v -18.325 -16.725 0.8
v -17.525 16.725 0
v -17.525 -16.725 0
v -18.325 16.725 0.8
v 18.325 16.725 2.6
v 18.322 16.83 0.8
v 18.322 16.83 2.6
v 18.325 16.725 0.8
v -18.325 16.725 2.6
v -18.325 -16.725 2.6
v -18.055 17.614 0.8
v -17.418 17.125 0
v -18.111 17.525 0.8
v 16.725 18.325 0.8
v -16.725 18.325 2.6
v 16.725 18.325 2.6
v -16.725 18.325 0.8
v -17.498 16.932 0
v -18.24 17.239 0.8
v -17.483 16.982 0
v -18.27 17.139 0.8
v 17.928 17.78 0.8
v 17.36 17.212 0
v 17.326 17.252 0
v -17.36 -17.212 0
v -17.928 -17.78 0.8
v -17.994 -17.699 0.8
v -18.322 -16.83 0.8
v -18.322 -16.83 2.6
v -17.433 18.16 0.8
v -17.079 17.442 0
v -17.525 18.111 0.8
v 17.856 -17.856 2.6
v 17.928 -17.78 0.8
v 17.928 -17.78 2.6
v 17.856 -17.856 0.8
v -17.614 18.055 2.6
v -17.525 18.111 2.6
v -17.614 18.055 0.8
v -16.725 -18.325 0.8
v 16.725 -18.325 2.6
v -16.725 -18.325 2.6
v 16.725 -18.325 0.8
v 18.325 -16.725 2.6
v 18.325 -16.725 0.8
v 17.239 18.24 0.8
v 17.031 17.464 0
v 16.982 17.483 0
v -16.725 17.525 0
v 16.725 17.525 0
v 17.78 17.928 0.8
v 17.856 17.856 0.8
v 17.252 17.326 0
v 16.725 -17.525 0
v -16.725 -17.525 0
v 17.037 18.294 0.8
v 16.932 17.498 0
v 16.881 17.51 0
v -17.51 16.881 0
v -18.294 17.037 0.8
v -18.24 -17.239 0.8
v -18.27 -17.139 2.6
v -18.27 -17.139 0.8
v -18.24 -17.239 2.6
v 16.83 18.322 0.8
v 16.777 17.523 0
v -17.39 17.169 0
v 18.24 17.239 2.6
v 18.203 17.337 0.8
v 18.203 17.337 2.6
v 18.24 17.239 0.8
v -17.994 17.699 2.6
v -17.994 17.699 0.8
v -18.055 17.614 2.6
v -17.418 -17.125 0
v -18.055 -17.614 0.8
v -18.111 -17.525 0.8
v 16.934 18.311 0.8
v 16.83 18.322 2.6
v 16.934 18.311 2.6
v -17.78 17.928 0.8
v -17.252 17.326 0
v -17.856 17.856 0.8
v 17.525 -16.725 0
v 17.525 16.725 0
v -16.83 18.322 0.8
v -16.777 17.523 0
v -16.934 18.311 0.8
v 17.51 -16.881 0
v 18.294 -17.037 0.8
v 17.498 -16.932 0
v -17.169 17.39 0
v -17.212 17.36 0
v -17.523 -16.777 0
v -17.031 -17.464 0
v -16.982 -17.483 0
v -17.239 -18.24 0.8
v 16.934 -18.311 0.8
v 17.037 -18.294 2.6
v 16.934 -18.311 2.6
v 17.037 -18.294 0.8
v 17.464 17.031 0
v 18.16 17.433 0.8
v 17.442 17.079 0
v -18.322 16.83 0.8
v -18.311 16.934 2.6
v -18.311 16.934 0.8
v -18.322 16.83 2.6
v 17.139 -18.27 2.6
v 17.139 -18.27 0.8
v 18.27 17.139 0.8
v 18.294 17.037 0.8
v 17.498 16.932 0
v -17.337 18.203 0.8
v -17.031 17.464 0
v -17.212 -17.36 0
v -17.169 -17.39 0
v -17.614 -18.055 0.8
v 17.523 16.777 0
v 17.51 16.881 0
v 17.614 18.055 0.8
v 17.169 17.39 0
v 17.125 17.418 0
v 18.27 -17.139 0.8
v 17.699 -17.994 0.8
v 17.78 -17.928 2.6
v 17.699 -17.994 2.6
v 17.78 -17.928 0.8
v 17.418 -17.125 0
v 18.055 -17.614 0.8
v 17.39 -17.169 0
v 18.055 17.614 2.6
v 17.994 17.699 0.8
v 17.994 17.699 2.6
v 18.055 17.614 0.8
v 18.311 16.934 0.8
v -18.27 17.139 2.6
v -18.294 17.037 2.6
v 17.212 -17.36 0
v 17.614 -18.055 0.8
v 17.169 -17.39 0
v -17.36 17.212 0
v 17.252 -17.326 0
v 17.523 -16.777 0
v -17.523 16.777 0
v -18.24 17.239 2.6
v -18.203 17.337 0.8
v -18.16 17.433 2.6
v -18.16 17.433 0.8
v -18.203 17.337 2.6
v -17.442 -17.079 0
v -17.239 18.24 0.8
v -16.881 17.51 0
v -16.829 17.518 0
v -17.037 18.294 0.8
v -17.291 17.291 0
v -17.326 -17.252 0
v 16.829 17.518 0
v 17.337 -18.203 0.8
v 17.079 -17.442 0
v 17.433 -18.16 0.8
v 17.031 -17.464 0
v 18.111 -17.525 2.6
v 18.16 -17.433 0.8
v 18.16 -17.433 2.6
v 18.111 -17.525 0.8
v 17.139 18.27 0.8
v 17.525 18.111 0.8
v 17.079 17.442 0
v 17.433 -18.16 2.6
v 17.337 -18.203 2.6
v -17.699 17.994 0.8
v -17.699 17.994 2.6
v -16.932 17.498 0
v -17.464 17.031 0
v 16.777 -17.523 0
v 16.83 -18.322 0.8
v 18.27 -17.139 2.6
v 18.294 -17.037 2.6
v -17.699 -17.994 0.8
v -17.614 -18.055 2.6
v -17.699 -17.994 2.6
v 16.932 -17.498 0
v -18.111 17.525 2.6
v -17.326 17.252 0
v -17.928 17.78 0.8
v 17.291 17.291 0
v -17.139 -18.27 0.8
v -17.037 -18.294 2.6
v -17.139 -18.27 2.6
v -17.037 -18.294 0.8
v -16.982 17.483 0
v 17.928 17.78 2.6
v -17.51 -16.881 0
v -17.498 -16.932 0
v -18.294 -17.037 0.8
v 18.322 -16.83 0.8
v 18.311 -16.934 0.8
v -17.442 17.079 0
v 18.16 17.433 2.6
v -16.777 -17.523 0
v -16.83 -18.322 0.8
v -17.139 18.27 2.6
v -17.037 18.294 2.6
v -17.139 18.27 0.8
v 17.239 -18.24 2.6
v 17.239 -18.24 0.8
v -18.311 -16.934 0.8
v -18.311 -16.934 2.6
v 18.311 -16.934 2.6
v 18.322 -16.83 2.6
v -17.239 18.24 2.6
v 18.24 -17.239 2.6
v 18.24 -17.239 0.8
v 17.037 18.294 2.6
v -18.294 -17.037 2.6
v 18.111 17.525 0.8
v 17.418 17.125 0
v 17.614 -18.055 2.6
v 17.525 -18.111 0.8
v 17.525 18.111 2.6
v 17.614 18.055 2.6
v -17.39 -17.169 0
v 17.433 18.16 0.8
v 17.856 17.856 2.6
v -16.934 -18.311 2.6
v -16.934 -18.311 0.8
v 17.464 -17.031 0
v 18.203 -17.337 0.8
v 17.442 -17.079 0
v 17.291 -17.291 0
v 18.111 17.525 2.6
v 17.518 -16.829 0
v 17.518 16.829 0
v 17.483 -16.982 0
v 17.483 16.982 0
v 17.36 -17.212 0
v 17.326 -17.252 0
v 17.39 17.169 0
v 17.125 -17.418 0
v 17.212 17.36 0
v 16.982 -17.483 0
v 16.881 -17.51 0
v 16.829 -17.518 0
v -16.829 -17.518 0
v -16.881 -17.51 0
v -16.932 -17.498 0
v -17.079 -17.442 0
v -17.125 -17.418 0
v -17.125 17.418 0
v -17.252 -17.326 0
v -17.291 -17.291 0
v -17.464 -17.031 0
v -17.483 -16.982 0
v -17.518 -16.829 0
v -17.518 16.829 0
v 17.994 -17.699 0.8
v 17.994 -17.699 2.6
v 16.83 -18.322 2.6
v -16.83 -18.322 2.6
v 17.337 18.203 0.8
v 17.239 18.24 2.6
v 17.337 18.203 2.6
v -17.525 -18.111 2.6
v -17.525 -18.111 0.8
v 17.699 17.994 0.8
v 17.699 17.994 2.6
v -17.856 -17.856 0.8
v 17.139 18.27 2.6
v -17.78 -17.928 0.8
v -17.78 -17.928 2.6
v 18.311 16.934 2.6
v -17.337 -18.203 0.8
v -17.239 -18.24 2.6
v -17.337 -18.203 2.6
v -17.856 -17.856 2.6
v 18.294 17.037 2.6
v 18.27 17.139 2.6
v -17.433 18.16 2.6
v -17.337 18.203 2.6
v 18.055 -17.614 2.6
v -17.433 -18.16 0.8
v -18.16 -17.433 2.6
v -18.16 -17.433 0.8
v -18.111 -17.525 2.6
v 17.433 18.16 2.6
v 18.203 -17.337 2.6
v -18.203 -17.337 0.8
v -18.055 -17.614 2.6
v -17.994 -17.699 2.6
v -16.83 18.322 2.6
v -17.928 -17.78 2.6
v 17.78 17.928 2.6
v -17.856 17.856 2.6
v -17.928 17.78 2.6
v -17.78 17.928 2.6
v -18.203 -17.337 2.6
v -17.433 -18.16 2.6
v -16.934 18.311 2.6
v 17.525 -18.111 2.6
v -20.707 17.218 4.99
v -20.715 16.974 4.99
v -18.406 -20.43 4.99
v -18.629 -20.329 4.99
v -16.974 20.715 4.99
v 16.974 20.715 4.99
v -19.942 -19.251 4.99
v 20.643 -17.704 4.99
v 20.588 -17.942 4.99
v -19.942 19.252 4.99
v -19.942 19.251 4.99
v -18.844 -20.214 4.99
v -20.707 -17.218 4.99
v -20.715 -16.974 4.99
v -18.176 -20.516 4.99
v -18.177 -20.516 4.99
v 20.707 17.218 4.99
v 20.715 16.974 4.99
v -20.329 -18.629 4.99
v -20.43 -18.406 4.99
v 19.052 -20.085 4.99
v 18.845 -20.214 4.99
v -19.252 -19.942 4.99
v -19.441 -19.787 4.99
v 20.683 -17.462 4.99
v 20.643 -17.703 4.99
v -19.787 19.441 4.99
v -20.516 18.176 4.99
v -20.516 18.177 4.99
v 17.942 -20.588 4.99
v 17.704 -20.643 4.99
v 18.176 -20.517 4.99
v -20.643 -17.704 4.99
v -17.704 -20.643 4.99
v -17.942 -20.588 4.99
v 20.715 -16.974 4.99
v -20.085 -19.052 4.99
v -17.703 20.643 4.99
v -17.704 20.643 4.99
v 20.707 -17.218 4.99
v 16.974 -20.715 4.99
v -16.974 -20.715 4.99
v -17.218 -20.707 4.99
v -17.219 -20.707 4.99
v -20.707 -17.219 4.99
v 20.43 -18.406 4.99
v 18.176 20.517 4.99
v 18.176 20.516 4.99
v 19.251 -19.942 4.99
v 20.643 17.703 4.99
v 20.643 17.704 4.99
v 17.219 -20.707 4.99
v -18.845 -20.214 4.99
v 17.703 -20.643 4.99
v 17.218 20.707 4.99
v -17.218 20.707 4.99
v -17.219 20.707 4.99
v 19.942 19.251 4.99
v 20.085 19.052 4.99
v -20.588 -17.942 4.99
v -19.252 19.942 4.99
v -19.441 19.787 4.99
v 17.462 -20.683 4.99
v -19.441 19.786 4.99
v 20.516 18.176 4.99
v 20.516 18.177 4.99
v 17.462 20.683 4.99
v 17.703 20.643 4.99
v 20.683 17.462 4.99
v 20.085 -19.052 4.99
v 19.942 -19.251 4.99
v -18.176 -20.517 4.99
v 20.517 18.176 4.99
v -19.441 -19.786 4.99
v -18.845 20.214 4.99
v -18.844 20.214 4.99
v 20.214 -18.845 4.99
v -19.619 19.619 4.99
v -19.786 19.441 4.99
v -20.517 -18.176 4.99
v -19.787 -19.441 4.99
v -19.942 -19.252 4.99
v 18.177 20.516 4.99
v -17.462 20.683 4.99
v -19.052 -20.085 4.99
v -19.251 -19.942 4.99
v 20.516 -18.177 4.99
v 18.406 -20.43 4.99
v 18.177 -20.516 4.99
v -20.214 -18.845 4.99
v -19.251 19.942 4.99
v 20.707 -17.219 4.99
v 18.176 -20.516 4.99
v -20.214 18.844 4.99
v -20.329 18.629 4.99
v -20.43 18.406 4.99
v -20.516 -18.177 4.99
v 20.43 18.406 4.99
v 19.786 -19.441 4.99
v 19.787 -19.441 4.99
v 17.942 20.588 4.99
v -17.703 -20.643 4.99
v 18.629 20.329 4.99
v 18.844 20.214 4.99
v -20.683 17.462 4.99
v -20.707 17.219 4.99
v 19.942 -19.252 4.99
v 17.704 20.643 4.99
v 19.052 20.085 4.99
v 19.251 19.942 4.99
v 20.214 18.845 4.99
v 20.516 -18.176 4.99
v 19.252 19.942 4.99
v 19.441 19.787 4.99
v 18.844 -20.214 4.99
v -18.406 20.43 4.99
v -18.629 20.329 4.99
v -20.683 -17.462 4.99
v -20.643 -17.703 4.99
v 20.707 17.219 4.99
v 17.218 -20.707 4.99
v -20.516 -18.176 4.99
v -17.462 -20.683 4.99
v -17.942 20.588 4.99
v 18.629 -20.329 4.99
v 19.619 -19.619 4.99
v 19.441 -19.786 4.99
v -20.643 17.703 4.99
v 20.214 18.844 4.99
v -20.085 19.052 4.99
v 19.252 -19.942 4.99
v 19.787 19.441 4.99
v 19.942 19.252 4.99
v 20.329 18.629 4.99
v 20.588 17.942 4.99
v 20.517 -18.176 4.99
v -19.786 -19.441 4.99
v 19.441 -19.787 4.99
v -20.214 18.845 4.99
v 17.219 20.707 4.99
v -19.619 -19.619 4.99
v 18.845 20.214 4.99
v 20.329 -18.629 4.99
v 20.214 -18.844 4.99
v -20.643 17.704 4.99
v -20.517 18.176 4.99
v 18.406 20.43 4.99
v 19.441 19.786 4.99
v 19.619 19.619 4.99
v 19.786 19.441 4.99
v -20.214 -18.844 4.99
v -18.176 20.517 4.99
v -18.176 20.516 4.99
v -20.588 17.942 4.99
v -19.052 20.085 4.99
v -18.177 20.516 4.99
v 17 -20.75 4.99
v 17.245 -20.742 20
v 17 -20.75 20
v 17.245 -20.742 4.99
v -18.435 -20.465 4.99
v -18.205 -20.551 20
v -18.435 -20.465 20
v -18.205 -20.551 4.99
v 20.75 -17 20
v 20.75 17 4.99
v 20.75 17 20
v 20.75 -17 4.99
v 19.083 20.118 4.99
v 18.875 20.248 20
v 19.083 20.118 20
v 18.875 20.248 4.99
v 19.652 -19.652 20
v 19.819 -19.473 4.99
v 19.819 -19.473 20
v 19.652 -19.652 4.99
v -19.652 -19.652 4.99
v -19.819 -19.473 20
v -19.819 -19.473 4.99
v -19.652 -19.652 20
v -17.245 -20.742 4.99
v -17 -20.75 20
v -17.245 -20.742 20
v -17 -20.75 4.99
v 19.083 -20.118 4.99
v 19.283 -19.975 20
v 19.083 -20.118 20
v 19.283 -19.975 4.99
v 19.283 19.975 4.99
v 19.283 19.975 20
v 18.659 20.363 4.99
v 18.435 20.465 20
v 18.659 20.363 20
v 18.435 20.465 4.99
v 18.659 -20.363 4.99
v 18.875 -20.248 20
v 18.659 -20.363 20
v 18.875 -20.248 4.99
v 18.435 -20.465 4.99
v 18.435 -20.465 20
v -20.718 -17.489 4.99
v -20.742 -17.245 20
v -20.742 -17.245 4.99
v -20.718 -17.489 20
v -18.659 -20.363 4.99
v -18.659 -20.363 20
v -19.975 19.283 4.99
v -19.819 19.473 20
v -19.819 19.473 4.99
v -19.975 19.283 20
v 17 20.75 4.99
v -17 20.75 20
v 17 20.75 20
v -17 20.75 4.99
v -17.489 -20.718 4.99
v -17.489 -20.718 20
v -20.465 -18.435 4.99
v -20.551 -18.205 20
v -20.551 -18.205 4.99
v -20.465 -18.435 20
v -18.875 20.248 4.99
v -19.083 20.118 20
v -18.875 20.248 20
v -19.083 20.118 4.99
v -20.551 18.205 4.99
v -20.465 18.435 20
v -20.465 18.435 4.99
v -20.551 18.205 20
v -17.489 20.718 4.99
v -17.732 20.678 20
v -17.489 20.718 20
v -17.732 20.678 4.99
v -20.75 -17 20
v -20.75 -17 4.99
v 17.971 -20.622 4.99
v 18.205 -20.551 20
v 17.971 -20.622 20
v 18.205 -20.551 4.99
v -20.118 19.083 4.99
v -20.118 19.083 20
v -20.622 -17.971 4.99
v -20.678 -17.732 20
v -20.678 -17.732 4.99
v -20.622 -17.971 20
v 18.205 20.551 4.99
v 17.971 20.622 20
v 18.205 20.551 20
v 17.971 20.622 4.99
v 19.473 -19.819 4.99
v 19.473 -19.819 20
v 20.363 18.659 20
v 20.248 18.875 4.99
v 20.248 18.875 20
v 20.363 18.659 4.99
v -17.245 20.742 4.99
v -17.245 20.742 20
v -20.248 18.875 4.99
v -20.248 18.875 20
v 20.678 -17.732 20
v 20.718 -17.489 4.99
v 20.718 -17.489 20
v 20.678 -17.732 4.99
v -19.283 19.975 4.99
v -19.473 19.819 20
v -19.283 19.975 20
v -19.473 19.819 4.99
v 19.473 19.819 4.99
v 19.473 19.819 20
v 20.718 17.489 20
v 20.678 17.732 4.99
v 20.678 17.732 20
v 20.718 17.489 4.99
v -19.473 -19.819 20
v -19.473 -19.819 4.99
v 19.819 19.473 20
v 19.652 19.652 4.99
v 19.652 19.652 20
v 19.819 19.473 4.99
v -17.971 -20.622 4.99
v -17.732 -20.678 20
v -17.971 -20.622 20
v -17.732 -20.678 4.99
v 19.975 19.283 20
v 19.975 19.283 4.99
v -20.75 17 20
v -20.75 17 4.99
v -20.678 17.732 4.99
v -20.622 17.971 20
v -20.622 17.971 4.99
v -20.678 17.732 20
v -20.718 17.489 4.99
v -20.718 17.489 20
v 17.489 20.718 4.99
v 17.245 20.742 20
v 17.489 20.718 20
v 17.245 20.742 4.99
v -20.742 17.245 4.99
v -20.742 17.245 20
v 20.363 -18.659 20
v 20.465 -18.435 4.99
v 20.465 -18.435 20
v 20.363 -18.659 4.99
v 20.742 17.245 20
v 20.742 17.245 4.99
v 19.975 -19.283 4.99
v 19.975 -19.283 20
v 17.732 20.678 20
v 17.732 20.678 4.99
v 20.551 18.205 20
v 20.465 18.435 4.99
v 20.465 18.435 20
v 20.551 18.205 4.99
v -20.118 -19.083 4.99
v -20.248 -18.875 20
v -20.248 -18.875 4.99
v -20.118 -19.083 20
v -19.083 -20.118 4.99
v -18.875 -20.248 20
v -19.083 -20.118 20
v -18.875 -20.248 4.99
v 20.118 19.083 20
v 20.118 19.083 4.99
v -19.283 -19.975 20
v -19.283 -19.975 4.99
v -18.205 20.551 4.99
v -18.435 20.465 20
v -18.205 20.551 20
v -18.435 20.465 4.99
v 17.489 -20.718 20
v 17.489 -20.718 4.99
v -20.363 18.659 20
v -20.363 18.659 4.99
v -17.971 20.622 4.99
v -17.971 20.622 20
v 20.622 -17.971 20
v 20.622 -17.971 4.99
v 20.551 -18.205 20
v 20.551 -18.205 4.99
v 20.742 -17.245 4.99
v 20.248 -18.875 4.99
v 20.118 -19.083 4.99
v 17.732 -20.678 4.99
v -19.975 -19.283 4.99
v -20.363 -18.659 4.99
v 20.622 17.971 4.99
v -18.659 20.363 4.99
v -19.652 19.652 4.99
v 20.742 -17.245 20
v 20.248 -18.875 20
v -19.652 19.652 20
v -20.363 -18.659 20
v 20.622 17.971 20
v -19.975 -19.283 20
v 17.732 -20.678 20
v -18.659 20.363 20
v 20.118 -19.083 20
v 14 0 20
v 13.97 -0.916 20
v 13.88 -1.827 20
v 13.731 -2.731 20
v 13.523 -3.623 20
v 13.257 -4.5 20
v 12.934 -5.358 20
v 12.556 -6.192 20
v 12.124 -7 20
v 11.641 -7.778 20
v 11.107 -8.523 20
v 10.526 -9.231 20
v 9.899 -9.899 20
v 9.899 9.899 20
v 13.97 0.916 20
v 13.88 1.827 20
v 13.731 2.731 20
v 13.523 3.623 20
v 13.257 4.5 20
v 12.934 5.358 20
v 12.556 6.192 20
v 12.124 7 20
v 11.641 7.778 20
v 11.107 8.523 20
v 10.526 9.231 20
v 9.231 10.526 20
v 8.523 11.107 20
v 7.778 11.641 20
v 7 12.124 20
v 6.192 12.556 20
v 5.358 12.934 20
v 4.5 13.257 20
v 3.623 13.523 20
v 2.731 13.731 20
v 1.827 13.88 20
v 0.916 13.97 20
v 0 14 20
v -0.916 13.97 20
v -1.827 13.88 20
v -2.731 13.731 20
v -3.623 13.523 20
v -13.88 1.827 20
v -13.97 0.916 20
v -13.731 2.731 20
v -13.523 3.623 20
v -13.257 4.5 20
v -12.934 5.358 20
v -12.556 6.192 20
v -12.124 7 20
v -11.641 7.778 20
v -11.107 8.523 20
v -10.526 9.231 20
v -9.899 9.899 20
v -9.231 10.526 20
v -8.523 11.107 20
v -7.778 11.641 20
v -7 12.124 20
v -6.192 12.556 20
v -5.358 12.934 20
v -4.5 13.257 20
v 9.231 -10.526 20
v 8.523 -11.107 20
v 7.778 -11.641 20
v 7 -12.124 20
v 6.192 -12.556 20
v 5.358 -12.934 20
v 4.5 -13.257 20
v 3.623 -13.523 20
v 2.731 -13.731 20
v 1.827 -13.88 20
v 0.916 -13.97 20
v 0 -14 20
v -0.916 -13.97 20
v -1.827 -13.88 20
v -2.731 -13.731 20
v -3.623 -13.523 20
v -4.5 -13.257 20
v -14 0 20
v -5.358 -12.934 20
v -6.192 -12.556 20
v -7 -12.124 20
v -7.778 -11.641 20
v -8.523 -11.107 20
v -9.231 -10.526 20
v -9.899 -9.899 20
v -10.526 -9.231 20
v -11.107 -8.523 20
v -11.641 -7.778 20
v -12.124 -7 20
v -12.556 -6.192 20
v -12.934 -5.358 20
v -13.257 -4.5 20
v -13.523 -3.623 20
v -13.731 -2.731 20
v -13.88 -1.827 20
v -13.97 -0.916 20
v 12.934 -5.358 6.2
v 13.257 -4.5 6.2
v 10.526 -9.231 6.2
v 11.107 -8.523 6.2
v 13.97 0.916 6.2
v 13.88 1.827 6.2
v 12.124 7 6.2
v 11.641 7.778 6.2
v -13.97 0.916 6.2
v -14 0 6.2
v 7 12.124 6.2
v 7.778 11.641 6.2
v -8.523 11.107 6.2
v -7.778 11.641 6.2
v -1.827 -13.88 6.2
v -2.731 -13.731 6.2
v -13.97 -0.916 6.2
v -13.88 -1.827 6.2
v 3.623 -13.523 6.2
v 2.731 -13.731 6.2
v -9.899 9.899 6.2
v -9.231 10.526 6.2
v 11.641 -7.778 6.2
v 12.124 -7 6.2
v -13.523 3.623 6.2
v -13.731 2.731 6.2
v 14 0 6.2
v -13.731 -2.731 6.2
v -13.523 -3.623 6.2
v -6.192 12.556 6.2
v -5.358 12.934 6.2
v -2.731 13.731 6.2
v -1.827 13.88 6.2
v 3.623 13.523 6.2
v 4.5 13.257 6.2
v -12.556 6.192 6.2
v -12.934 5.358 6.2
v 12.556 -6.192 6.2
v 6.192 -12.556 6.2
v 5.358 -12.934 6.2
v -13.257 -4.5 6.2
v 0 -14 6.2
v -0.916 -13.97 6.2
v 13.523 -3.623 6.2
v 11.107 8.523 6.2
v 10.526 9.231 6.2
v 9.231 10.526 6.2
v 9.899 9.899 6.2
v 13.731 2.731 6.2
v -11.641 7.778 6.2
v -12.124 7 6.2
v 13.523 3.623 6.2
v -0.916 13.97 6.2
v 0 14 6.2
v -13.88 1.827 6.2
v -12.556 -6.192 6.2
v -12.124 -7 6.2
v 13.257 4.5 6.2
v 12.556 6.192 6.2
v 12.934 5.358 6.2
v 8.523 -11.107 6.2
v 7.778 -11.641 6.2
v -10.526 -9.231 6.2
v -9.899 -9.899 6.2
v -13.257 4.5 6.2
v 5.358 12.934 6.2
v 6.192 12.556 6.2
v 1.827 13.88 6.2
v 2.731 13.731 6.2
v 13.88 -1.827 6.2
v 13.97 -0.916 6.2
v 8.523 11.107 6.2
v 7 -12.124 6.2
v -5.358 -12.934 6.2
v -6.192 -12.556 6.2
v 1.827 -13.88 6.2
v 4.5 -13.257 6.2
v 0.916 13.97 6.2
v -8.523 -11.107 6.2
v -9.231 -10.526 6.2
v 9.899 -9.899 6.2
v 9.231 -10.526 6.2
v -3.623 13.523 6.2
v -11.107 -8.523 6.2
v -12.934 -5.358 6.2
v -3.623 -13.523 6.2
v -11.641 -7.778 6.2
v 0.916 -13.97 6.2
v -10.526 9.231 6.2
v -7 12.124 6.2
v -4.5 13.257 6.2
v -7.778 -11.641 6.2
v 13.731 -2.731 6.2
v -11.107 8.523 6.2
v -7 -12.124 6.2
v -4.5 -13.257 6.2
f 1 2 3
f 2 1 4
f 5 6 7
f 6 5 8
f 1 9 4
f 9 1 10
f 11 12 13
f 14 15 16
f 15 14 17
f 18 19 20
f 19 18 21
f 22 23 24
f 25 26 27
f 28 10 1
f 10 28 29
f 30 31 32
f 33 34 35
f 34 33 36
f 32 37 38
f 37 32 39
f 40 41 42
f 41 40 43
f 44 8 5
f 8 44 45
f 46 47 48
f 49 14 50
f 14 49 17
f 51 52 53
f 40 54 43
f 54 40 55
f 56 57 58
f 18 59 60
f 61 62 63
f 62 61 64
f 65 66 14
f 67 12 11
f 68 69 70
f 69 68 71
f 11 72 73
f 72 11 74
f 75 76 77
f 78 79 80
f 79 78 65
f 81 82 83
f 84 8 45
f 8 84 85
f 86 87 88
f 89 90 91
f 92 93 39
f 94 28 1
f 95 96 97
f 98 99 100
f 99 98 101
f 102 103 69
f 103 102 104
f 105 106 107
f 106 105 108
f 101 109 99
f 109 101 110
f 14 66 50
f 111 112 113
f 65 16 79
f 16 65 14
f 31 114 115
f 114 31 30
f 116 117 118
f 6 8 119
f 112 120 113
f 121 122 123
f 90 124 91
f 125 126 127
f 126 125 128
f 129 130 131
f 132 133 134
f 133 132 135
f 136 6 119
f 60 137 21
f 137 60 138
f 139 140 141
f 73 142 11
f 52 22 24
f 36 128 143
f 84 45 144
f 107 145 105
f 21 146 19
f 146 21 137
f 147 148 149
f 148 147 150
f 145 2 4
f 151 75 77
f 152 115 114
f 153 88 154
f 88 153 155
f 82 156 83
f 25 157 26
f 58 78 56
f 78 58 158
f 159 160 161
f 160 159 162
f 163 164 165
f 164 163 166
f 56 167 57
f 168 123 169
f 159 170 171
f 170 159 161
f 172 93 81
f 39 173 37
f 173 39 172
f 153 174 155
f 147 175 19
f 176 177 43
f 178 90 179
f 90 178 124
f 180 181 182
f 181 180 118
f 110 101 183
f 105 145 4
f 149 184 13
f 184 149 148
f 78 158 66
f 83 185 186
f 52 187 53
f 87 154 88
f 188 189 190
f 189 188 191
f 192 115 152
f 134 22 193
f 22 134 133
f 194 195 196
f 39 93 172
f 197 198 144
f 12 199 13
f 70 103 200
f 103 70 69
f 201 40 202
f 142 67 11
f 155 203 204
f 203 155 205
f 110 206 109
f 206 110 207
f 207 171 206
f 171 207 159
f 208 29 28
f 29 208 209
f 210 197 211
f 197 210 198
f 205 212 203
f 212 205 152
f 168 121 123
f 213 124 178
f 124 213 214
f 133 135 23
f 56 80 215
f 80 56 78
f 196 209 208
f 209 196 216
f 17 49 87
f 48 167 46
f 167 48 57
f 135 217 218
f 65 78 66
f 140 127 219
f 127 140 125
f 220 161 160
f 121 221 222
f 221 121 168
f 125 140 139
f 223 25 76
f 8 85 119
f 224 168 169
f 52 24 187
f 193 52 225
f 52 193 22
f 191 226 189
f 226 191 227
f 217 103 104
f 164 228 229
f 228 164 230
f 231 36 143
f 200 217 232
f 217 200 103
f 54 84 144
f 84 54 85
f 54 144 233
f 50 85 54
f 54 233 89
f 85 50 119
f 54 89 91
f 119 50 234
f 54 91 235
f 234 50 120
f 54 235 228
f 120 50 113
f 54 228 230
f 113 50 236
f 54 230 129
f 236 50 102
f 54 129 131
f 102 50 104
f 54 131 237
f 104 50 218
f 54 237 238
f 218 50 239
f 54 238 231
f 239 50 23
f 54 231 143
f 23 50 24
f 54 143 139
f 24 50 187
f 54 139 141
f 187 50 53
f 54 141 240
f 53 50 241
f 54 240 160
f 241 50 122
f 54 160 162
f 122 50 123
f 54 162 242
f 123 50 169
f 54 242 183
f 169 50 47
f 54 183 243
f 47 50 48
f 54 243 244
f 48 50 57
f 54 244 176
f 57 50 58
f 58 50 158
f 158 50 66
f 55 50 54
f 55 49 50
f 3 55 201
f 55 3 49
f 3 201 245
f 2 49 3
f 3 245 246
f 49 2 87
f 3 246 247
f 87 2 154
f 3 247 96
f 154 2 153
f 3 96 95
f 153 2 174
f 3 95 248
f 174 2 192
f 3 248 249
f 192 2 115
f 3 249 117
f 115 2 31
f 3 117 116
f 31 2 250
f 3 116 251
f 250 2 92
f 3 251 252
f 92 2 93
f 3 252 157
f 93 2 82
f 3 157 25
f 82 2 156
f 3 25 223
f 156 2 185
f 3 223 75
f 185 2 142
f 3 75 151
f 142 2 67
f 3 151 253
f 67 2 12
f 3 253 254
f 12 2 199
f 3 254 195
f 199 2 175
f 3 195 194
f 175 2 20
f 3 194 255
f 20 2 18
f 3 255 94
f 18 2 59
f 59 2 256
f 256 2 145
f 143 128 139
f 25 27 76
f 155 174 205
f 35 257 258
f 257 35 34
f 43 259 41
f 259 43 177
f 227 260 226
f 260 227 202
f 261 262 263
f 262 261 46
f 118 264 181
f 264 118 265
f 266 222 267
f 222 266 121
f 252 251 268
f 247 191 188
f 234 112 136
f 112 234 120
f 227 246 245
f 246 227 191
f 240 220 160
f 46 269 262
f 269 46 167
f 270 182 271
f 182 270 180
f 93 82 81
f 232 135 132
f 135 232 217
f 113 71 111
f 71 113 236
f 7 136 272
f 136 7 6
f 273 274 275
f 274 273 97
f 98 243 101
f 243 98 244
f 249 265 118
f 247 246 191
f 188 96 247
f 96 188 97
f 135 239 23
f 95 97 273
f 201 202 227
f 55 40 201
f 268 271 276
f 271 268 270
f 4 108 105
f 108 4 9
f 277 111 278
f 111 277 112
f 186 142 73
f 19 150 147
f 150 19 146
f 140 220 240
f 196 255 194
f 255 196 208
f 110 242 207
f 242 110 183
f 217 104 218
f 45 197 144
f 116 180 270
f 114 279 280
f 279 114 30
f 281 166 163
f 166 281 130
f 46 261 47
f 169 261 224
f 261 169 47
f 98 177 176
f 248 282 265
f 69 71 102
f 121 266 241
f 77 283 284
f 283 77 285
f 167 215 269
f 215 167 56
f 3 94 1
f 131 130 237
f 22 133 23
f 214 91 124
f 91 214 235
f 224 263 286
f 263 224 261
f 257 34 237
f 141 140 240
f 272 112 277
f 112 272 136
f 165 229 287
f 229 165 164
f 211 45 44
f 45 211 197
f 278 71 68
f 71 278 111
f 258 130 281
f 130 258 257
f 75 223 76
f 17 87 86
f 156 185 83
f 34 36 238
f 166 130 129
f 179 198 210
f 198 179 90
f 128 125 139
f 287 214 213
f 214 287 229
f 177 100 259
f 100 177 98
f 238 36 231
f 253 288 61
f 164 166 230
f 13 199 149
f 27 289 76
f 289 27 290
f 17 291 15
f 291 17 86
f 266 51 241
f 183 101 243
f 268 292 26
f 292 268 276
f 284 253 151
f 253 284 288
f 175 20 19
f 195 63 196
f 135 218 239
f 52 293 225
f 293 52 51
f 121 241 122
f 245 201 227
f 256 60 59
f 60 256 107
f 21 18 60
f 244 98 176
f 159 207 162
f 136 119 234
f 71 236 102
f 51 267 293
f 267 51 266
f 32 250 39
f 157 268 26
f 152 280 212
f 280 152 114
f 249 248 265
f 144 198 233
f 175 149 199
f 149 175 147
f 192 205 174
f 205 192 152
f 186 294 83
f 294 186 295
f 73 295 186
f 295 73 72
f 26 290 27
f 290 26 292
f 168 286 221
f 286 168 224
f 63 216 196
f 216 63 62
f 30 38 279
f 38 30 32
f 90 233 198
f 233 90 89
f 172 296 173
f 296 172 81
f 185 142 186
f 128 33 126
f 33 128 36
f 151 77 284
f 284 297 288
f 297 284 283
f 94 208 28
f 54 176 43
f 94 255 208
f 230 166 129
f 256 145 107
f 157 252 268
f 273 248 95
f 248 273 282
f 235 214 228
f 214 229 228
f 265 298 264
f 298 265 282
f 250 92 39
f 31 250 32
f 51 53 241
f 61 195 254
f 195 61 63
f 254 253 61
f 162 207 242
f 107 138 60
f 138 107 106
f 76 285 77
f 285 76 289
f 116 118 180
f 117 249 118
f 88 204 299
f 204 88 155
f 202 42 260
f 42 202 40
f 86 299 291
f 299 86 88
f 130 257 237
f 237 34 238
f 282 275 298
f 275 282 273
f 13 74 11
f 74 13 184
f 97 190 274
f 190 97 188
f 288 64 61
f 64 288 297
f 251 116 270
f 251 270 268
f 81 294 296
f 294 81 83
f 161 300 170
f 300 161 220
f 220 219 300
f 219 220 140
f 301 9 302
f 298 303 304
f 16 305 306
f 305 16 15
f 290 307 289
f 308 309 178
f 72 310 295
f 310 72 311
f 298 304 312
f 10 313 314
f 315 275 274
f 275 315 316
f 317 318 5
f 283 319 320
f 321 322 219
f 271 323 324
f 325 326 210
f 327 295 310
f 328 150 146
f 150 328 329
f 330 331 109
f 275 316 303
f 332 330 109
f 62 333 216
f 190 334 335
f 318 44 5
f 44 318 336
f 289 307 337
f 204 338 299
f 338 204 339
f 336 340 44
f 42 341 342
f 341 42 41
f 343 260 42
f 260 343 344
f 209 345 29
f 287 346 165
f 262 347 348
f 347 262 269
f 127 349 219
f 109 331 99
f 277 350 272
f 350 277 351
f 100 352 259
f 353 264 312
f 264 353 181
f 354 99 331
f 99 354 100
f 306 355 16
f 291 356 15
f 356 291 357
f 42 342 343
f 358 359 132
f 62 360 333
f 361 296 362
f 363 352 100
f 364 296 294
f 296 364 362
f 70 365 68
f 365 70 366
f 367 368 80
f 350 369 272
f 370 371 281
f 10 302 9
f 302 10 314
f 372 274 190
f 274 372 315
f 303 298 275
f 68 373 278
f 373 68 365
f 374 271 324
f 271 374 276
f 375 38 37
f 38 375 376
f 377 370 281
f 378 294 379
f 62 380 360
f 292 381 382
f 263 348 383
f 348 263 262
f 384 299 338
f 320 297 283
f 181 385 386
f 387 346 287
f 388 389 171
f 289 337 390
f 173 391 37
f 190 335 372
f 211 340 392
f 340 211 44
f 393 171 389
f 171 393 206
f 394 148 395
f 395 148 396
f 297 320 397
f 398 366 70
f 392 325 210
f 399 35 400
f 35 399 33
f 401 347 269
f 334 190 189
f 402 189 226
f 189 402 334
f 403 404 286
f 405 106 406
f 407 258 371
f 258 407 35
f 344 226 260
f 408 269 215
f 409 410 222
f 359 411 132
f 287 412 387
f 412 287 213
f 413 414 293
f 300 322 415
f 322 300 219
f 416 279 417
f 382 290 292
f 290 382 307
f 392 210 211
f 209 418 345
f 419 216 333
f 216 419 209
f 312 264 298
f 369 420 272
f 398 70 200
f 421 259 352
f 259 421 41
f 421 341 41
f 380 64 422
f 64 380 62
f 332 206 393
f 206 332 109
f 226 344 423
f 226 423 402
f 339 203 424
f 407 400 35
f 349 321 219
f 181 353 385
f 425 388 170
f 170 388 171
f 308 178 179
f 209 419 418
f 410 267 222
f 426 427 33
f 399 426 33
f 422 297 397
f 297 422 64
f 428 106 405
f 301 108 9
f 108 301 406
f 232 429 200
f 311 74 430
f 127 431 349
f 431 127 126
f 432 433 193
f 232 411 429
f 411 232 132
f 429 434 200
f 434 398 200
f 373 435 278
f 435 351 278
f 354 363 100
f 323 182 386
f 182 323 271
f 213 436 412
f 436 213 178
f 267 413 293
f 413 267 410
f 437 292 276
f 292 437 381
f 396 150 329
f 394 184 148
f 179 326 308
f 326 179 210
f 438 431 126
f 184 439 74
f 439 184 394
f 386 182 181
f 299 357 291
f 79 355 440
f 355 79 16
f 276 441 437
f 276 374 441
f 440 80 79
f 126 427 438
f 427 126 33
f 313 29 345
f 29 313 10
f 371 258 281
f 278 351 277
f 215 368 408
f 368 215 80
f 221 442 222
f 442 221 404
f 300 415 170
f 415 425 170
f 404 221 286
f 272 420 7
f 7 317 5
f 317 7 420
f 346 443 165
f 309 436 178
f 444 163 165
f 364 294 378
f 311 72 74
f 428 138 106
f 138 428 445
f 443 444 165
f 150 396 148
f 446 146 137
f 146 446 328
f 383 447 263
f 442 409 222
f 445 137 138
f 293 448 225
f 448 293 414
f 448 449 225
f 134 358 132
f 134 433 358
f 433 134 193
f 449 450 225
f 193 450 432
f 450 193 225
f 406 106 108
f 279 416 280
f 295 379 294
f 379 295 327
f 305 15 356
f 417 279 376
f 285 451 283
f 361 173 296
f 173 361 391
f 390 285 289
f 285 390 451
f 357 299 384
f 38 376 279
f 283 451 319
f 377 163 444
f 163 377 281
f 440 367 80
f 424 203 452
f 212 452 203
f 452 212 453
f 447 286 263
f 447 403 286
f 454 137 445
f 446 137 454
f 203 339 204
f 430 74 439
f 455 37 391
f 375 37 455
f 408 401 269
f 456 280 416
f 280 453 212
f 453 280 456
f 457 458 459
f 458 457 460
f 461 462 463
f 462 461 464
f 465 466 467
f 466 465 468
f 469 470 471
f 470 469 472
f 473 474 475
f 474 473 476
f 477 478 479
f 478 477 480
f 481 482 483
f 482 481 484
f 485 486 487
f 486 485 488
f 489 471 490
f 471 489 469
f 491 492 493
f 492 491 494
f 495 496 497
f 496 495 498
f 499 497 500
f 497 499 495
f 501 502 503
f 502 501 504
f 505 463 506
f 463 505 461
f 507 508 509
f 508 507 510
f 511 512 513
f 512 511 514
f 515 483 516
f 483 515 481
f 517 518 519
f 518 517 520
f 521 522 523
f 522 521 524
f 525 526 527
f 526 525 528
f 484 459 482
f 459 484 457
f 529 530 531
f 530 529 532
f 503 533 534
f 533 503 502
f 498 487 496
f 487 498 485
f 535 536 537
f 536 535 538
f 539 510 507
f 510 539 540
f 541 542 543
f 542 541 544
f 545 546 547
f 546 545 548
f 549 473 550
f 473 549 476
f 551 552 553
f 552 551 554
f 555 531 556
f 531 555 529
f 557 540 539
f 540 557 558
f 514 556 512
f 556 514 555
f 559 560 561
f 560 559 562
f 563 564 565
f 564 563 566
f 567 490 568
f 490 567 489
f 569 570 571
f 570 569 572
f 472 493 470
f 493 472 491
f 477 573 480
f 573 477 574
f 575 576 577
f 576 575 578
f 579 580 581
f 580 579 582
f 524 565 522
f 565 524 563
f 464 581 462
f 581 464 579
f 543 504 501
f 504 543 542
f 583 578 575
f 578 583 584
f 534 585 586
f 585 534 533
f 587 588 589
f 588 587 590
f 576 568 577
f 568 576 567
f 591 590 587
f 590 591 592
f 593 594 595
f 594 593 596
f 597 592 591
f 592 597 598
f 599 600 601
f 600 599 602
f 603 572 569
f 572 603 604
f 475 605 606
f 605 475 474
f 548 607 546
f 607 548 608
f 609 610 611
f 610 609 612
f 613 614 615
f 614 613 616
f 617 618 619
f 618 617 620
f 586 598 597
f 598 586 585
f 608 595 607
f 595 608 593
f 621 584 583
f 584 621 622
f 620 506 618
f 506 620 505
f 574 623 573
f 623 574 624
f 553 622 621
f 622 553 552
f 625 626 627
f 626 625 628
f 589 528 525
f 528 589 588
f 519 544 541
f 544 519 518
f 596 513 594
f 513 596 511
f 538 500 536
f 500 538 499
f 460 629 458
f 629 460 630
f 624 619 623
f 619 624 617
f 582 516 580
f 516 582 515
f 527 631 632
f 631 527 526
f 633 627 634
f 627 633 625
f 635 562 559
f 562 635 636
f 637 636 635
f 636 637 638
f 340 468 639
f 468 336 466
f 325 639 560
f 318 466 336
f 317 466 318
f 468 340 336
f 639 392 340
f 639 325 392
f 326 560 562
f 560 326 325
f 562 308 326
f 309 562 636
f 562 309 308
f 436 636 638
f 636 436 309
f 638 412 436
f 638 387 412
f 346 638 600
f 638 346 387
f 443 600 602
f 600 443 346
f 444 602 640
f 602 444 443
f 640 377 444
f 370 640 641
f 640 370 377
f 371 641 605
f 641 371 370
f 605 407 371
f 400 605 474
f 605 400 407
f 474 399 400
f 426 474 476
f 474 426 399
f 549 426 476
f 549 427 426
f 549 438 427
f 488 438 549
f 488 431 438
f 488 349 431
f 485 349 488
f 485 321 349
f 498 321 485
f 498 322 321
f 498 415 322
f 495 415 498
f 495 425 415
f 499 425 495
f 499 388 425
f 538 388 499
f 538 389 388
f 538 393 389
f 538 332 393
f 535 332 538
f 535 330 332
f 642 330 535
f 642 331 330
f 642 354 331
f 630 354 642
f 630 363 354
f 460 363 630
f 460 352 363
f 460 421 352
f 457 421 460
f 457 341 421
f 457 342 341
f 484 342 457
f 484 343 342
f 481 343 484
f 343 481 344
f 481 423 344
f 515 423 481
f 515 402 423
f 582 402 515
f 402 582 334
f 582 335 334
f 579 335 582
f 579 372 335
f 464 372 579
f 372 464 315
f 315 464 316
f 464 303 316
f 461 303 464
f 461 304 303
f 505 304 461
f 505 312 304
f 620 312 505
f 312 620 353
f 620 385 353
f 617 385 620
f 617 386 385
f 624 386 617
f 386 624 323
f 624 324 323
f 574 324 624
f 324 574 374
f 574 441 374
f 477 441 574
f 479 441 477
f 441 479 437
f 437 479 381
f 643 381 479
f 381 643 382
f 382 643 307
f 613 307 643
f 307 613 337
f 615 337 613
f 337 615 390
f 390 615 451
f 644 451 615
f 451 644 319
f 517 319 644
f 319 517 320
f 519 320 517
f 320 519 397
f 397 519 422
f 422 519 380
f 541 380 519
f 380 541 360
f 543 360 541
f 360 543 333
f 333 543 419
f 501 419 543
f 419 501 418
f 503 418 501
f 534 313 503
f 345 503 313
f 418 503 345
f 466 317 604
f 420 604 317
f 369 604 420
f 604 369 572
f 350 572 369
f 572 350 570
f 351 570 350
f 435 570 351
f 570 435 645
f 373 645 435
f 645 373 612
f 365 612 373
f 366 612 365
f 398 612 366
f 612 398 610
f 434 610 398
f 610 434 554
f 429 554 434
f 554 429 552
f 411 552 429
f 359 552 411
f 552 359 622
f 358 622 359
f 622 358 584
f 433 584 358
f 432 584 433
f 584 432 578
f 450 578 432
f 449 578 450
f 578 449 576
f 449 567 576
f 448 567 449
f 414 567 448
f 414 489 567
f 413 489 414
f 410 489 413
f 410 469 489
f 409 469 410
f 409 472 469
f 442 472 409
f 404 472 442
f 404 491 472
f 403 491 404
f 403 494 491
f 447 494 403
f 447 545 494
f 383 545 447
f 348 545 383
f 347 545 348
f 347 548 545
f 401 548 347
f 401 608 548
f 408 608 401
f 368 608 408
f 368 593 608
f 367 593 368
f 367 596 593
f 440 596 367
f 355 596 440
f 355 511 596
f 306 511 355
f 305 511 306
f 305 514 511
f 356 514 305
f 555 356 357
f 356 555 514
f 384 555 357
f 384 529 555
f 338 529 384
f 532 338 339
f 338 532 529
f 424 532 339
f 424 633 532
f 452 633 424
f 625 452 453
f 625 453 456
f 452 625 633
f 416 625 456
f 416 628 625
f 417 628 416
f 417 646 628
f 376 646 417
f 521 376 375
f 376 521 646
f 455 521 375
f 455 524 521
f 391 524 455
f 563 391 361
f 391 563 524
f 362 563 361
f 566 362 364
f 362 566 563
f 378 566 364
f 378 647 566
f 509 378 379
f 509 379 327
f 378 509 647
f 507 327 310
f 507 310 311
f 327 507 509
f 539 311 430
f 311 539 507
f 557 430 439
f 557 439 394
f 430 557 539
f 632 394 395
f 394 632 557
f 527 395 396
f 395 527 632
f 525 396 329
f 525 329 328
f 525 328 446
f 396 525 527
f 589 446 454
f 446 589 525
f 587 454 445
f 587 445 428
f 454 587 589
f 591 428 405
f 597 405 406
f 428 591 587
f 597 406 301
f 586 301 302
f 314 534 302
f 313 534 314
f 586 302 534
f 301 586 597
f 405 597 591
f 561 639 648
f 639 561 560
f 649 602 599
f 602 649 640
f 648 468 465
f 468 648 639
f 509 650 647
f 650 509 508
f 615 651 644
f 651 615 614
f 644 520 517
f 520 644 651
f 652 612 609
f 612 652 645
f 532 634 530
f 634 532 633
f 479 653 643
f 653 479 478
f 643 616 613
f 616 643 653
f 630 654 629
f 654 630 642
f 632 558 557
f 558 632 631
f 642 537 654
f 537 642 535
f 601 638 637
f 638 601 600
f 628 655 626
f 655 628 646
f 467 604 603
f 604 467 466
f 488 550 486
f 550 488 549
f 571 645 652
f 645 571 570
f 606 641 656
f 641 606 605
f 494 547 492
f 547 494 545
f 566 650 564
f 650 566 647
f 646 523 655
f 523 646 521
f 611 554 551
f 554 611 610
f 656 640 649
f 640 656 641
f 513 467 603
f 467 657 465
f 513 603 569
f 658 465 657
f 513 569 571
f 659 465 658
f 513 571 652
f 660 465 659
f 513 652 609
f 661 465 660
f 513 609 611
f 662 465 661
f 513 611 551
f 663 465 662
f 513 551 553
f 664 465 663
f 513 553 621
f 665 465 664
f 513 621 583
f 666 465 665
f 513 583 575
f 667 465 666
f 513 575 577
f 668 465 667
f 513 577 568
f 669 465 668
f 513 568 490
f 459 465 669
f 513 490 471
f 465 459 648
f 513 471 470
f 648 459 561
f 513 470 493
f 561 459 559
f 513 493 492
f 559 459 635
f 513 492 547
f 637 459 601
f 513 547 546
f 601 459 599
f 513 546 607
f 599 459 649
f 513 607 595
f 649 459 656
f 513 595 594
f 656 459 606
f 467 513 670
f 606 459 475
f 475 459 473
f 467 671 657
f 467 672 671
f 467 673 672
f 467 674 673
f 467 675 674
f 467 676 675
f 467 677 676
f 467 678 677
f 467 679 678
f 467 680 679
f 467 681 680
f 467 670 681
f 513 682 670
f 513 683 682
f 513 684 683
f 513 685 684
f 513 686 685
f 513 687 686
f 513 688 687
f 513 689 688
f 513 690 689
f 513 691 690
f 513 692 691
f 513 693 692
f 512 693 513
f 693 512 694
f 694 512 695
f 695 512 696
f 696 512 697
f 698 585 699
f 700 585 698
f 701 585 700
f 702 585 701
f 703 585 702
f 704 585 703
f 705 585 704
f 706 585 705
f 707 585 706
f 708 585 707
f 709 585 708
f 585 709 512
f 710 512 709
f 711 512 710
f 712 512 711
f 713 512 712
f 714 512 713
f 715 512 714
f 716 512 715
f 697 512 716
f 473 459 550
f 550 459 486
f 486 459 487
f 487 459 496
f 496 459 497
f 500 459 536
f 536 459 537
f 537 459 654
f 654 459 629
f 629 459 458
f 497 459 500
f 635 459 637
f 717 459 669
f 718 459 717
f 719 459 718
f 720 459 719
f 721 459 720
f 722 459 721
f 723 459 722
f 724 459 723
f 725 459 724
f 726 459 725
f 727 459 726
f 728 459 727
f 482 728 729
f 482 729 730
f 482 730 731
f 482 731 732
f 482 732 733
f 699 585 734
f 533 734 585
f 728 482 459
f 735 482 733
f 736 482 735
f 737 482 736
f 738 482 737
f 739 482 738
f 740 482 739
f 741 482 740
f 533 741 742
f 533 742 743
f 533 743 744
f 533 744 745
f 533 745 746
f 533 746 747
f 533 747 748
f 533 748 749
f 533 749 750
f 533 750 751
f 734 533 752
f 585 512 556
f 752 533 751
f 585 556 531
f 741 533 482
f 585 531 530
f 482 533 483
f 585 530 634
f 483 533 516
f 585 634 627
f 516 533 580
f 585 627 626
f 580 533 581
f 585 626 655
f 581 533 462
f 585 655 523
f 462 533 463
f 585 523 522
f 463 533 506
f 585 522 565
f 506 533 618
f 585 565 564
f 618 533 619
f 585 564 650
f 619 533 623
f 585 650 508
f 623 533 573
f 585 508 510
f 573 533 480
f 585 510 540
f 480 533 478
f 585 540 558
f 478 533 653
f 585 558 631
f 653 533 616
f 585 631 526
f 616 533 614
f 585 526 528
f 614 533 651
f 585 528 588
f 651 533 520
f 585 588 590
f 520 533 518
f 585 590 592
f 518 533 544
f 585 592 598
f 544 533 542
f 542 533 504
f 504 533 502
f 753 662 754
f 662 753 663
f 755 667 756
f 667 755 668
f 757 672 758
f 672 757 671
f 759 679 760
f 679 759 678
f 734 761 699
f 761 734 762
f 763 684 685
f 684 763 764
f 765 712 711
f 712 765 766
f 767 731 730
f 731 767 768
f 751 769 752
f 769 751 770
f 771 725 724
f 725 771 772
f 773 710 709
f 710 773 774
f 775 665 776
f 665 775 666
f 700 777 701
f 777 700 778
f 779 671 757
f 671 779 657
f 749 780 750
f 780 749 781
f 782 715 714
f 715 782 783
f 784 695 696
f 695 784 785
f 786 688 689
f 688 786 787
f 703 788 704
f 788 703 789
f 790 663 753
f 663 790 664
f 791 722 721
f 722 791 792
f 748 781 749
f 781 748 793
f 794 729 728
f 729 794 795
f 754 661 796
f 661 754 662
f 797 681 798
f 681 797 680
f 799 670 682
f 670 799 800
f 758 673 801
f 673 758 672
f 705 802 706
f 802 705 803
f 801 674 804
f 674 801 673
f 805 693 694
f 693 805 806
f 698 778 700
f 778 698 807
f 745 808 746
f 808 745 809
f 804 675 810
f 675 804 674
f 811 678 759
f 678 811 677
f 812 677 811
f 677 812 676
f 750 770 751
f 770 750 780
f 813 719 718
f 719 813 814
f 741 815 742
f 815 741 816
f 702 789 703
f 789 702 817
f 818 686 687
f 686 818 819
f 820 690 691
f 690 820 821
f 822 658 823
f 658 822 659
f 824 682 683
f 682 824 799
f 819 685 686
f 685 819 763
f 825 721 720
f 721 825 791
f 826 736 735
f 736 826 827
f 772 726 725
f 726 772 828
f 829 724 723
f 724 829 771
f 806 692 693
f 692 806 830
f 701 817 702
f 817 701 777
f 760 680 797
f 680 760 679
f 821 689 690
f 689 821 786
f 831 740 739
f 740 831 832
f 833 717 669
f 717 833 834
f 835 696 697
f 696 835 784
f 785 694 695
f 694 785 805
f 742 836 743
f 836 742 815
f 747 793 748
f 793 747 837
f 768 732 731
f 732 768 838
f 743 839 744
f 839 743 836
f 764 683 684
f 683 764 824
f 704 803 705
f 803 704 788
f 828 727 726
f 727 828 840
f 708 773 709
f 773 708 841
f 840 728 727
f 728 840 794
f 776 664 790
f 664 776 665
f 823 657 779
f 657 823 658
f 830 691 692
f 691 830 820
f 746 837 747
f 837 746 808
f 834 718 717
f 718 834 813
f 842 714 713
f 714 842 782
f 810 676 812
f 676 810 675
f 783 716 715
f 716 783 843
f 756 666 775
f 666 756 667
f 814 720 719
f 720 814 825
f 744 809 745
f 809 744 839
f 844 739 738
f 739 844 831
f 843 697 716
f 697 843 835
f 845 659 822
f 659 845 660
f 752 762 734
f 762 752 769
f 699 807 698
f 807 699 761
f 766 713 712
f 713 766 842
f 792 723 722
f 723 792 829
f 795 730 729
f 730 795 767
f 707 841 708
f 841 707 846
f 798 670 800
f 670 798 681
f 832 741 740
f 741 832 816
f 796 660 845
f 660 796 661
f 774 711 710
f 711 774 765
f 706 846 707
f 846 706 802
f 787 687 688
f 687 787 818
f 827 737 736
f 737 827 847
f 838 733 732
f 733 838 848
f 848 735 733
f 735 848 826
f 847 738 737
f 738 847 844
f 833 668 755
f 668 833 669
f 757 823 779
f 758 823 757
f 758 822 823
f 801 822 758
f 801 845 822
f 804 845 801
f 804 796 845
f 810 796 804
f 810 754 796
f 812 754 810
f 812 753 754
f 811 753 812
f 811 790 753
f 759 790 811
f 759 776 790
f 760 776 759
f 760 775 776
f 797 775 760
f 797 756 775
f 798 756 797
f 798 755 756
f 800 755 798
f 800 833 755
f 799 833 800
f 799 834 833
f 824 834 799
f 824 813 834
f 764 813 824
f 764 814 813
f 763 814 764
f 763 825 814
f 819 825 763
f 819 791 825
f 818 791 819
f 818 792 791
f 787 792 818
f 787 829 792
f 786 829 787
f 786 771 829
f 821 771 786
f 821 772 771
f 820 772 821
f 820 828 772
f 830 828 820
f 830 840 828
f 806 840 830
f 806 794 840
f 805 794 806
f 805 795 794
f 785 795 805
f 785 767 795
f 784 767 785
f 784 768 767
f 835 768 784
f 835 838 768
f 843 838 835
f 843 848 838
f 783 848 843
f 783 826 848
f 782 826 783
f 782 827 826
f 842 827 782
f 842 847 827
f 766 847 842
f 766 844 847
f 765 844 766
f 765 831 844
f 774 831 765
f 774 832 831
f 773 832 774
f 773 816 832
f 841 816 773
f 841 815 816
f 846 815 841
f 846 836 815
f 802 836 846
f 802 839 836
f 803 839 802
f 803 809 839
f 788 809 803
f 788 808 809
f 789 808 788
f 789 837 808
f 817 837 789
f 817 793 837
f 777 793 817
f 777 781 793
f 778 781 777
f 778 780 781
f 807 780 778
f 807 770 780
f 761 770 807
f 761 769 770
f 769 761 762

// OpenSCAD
/*
Gridfinity 1x1 cylindrical holder
---------------------------------
PROMPT:
Create a standalone OpenSCAD model of a 1×1 Gridfinity holder, 41.5 × 41.5 mm and 20 mm tall. Use a true Gridfinity base socket based on block_base_solid() from gridfinity-rebuilt-openscad. Add a centered cylindrical pocket, 28 mm diameter, open at the top, with a 1.2 mm floor above the Gridfinity base. No magnet or screw holes. Output only the .scad file.


Overall height: 20 mm
Grid footprint: 1 x 1
Pocket diameter: 28 mm

The bottom base geometry is a standalone adaptation of block_base_solid()
from kennetek/gridfinity-rebuilt-openscad, using the dimensions from the
referenced commit's standard.scad.

No external OpenSCAD libraries are required.
*/

$fn = 96;

// ---------- Holder dimensions ----------
overall_height = 20;
pocket_diameter = 28;
floor_thickness = 1.2;

// ---------- Gridfinity standard dimensions ----------
l_grid = 42;
bin_clearance = 0.5;
outer_size = l_grid - bin_clearance;   // 41.5 mm

h_base = 5;
h_bot = 2.2;

r_c1 = 0.8;      // lower base chamfer
r_c2 = 2.4;      // upper base chamfer

r_fo1 = 7.5 / 2; // 3.75 mm
r_fo2 = 3.2 / 2; // 1.60 mm
r_fo3 = 1.6 / 2; // 0.80 mm

epsilon = 0.01;

// Rounded rectangle matching the utility module's implementation.
module rounded_rectangle(length, width, height, radius) {
    linear_extrude(height)
        offset(radius)
            offset(-radius)
                square([length, width], center = true);
}

/*
Standalone Gridfinity base socket.

This follows the referenced block_base_solid() construction:
- full 41.5 mm profile at the top of the foot
- 2.4 mm upper transition
- 0.8 mm lower transition
- 5 mm total base height
*/
module gridfinity_base_solid() {
    xx = outer_size - 0.05;
    yy = outer_size - 0.05;

    translate([0, 0, h_base])
        mirror([0, 0, 1])
            union() {
                // Lower portion of the foot:
                // transition between the smallest and middle profiles.
                hull() {
                    rounded_rectangle(
                        xx - 2*r_c2 - 2*r_c1,
                        yy - 2*r_c2 - 2*r_c1,
                        h_base,
                        r_fo3
                    );

                    rounded_rectangle(
                        xx - 2*r_c2,
                        yy - 2*r_c2,
                        h_base - r_c1,
                        r_fo2
                    );
                }

                // Upper transition from the middle profile to the
                // full-width Gridfinity body.
                hull() {
                    rounded_rectangle(
                        xx - 2*r_c2,
                        yy - 2*r_c2,
                        r_c2,
                        r_fo2
                    );

                    mirror([0, 0, 1])
                        rounded_rectangle(
                            xx,
                            yy,
                            h_bot / 2,
                            r_fo1
                        );
                }
            }
}

// Solid body above the Gridfinity base.
// The 28 mm cylindrical pocket leaves a 1.2 mm floor above the base.
module holder_body() {
    pocket_bottom = h_base + floor_thickness;

    difference() {
        translate([0, 0, h_base - epsilon])
            rounded_rectangle(
                outer_size,
                outer_size,
                overall_height - h_base + epsilon,
                r_fo1
            );

        translate([0, 0, pocket_bottom])
            cylinder(
                d = pocket_diameter,
                h = overall_height - pocket_bottom + epsilon
            );
    }
}

union() {
    gridfinity_base_solid();
    holder_body();
}
